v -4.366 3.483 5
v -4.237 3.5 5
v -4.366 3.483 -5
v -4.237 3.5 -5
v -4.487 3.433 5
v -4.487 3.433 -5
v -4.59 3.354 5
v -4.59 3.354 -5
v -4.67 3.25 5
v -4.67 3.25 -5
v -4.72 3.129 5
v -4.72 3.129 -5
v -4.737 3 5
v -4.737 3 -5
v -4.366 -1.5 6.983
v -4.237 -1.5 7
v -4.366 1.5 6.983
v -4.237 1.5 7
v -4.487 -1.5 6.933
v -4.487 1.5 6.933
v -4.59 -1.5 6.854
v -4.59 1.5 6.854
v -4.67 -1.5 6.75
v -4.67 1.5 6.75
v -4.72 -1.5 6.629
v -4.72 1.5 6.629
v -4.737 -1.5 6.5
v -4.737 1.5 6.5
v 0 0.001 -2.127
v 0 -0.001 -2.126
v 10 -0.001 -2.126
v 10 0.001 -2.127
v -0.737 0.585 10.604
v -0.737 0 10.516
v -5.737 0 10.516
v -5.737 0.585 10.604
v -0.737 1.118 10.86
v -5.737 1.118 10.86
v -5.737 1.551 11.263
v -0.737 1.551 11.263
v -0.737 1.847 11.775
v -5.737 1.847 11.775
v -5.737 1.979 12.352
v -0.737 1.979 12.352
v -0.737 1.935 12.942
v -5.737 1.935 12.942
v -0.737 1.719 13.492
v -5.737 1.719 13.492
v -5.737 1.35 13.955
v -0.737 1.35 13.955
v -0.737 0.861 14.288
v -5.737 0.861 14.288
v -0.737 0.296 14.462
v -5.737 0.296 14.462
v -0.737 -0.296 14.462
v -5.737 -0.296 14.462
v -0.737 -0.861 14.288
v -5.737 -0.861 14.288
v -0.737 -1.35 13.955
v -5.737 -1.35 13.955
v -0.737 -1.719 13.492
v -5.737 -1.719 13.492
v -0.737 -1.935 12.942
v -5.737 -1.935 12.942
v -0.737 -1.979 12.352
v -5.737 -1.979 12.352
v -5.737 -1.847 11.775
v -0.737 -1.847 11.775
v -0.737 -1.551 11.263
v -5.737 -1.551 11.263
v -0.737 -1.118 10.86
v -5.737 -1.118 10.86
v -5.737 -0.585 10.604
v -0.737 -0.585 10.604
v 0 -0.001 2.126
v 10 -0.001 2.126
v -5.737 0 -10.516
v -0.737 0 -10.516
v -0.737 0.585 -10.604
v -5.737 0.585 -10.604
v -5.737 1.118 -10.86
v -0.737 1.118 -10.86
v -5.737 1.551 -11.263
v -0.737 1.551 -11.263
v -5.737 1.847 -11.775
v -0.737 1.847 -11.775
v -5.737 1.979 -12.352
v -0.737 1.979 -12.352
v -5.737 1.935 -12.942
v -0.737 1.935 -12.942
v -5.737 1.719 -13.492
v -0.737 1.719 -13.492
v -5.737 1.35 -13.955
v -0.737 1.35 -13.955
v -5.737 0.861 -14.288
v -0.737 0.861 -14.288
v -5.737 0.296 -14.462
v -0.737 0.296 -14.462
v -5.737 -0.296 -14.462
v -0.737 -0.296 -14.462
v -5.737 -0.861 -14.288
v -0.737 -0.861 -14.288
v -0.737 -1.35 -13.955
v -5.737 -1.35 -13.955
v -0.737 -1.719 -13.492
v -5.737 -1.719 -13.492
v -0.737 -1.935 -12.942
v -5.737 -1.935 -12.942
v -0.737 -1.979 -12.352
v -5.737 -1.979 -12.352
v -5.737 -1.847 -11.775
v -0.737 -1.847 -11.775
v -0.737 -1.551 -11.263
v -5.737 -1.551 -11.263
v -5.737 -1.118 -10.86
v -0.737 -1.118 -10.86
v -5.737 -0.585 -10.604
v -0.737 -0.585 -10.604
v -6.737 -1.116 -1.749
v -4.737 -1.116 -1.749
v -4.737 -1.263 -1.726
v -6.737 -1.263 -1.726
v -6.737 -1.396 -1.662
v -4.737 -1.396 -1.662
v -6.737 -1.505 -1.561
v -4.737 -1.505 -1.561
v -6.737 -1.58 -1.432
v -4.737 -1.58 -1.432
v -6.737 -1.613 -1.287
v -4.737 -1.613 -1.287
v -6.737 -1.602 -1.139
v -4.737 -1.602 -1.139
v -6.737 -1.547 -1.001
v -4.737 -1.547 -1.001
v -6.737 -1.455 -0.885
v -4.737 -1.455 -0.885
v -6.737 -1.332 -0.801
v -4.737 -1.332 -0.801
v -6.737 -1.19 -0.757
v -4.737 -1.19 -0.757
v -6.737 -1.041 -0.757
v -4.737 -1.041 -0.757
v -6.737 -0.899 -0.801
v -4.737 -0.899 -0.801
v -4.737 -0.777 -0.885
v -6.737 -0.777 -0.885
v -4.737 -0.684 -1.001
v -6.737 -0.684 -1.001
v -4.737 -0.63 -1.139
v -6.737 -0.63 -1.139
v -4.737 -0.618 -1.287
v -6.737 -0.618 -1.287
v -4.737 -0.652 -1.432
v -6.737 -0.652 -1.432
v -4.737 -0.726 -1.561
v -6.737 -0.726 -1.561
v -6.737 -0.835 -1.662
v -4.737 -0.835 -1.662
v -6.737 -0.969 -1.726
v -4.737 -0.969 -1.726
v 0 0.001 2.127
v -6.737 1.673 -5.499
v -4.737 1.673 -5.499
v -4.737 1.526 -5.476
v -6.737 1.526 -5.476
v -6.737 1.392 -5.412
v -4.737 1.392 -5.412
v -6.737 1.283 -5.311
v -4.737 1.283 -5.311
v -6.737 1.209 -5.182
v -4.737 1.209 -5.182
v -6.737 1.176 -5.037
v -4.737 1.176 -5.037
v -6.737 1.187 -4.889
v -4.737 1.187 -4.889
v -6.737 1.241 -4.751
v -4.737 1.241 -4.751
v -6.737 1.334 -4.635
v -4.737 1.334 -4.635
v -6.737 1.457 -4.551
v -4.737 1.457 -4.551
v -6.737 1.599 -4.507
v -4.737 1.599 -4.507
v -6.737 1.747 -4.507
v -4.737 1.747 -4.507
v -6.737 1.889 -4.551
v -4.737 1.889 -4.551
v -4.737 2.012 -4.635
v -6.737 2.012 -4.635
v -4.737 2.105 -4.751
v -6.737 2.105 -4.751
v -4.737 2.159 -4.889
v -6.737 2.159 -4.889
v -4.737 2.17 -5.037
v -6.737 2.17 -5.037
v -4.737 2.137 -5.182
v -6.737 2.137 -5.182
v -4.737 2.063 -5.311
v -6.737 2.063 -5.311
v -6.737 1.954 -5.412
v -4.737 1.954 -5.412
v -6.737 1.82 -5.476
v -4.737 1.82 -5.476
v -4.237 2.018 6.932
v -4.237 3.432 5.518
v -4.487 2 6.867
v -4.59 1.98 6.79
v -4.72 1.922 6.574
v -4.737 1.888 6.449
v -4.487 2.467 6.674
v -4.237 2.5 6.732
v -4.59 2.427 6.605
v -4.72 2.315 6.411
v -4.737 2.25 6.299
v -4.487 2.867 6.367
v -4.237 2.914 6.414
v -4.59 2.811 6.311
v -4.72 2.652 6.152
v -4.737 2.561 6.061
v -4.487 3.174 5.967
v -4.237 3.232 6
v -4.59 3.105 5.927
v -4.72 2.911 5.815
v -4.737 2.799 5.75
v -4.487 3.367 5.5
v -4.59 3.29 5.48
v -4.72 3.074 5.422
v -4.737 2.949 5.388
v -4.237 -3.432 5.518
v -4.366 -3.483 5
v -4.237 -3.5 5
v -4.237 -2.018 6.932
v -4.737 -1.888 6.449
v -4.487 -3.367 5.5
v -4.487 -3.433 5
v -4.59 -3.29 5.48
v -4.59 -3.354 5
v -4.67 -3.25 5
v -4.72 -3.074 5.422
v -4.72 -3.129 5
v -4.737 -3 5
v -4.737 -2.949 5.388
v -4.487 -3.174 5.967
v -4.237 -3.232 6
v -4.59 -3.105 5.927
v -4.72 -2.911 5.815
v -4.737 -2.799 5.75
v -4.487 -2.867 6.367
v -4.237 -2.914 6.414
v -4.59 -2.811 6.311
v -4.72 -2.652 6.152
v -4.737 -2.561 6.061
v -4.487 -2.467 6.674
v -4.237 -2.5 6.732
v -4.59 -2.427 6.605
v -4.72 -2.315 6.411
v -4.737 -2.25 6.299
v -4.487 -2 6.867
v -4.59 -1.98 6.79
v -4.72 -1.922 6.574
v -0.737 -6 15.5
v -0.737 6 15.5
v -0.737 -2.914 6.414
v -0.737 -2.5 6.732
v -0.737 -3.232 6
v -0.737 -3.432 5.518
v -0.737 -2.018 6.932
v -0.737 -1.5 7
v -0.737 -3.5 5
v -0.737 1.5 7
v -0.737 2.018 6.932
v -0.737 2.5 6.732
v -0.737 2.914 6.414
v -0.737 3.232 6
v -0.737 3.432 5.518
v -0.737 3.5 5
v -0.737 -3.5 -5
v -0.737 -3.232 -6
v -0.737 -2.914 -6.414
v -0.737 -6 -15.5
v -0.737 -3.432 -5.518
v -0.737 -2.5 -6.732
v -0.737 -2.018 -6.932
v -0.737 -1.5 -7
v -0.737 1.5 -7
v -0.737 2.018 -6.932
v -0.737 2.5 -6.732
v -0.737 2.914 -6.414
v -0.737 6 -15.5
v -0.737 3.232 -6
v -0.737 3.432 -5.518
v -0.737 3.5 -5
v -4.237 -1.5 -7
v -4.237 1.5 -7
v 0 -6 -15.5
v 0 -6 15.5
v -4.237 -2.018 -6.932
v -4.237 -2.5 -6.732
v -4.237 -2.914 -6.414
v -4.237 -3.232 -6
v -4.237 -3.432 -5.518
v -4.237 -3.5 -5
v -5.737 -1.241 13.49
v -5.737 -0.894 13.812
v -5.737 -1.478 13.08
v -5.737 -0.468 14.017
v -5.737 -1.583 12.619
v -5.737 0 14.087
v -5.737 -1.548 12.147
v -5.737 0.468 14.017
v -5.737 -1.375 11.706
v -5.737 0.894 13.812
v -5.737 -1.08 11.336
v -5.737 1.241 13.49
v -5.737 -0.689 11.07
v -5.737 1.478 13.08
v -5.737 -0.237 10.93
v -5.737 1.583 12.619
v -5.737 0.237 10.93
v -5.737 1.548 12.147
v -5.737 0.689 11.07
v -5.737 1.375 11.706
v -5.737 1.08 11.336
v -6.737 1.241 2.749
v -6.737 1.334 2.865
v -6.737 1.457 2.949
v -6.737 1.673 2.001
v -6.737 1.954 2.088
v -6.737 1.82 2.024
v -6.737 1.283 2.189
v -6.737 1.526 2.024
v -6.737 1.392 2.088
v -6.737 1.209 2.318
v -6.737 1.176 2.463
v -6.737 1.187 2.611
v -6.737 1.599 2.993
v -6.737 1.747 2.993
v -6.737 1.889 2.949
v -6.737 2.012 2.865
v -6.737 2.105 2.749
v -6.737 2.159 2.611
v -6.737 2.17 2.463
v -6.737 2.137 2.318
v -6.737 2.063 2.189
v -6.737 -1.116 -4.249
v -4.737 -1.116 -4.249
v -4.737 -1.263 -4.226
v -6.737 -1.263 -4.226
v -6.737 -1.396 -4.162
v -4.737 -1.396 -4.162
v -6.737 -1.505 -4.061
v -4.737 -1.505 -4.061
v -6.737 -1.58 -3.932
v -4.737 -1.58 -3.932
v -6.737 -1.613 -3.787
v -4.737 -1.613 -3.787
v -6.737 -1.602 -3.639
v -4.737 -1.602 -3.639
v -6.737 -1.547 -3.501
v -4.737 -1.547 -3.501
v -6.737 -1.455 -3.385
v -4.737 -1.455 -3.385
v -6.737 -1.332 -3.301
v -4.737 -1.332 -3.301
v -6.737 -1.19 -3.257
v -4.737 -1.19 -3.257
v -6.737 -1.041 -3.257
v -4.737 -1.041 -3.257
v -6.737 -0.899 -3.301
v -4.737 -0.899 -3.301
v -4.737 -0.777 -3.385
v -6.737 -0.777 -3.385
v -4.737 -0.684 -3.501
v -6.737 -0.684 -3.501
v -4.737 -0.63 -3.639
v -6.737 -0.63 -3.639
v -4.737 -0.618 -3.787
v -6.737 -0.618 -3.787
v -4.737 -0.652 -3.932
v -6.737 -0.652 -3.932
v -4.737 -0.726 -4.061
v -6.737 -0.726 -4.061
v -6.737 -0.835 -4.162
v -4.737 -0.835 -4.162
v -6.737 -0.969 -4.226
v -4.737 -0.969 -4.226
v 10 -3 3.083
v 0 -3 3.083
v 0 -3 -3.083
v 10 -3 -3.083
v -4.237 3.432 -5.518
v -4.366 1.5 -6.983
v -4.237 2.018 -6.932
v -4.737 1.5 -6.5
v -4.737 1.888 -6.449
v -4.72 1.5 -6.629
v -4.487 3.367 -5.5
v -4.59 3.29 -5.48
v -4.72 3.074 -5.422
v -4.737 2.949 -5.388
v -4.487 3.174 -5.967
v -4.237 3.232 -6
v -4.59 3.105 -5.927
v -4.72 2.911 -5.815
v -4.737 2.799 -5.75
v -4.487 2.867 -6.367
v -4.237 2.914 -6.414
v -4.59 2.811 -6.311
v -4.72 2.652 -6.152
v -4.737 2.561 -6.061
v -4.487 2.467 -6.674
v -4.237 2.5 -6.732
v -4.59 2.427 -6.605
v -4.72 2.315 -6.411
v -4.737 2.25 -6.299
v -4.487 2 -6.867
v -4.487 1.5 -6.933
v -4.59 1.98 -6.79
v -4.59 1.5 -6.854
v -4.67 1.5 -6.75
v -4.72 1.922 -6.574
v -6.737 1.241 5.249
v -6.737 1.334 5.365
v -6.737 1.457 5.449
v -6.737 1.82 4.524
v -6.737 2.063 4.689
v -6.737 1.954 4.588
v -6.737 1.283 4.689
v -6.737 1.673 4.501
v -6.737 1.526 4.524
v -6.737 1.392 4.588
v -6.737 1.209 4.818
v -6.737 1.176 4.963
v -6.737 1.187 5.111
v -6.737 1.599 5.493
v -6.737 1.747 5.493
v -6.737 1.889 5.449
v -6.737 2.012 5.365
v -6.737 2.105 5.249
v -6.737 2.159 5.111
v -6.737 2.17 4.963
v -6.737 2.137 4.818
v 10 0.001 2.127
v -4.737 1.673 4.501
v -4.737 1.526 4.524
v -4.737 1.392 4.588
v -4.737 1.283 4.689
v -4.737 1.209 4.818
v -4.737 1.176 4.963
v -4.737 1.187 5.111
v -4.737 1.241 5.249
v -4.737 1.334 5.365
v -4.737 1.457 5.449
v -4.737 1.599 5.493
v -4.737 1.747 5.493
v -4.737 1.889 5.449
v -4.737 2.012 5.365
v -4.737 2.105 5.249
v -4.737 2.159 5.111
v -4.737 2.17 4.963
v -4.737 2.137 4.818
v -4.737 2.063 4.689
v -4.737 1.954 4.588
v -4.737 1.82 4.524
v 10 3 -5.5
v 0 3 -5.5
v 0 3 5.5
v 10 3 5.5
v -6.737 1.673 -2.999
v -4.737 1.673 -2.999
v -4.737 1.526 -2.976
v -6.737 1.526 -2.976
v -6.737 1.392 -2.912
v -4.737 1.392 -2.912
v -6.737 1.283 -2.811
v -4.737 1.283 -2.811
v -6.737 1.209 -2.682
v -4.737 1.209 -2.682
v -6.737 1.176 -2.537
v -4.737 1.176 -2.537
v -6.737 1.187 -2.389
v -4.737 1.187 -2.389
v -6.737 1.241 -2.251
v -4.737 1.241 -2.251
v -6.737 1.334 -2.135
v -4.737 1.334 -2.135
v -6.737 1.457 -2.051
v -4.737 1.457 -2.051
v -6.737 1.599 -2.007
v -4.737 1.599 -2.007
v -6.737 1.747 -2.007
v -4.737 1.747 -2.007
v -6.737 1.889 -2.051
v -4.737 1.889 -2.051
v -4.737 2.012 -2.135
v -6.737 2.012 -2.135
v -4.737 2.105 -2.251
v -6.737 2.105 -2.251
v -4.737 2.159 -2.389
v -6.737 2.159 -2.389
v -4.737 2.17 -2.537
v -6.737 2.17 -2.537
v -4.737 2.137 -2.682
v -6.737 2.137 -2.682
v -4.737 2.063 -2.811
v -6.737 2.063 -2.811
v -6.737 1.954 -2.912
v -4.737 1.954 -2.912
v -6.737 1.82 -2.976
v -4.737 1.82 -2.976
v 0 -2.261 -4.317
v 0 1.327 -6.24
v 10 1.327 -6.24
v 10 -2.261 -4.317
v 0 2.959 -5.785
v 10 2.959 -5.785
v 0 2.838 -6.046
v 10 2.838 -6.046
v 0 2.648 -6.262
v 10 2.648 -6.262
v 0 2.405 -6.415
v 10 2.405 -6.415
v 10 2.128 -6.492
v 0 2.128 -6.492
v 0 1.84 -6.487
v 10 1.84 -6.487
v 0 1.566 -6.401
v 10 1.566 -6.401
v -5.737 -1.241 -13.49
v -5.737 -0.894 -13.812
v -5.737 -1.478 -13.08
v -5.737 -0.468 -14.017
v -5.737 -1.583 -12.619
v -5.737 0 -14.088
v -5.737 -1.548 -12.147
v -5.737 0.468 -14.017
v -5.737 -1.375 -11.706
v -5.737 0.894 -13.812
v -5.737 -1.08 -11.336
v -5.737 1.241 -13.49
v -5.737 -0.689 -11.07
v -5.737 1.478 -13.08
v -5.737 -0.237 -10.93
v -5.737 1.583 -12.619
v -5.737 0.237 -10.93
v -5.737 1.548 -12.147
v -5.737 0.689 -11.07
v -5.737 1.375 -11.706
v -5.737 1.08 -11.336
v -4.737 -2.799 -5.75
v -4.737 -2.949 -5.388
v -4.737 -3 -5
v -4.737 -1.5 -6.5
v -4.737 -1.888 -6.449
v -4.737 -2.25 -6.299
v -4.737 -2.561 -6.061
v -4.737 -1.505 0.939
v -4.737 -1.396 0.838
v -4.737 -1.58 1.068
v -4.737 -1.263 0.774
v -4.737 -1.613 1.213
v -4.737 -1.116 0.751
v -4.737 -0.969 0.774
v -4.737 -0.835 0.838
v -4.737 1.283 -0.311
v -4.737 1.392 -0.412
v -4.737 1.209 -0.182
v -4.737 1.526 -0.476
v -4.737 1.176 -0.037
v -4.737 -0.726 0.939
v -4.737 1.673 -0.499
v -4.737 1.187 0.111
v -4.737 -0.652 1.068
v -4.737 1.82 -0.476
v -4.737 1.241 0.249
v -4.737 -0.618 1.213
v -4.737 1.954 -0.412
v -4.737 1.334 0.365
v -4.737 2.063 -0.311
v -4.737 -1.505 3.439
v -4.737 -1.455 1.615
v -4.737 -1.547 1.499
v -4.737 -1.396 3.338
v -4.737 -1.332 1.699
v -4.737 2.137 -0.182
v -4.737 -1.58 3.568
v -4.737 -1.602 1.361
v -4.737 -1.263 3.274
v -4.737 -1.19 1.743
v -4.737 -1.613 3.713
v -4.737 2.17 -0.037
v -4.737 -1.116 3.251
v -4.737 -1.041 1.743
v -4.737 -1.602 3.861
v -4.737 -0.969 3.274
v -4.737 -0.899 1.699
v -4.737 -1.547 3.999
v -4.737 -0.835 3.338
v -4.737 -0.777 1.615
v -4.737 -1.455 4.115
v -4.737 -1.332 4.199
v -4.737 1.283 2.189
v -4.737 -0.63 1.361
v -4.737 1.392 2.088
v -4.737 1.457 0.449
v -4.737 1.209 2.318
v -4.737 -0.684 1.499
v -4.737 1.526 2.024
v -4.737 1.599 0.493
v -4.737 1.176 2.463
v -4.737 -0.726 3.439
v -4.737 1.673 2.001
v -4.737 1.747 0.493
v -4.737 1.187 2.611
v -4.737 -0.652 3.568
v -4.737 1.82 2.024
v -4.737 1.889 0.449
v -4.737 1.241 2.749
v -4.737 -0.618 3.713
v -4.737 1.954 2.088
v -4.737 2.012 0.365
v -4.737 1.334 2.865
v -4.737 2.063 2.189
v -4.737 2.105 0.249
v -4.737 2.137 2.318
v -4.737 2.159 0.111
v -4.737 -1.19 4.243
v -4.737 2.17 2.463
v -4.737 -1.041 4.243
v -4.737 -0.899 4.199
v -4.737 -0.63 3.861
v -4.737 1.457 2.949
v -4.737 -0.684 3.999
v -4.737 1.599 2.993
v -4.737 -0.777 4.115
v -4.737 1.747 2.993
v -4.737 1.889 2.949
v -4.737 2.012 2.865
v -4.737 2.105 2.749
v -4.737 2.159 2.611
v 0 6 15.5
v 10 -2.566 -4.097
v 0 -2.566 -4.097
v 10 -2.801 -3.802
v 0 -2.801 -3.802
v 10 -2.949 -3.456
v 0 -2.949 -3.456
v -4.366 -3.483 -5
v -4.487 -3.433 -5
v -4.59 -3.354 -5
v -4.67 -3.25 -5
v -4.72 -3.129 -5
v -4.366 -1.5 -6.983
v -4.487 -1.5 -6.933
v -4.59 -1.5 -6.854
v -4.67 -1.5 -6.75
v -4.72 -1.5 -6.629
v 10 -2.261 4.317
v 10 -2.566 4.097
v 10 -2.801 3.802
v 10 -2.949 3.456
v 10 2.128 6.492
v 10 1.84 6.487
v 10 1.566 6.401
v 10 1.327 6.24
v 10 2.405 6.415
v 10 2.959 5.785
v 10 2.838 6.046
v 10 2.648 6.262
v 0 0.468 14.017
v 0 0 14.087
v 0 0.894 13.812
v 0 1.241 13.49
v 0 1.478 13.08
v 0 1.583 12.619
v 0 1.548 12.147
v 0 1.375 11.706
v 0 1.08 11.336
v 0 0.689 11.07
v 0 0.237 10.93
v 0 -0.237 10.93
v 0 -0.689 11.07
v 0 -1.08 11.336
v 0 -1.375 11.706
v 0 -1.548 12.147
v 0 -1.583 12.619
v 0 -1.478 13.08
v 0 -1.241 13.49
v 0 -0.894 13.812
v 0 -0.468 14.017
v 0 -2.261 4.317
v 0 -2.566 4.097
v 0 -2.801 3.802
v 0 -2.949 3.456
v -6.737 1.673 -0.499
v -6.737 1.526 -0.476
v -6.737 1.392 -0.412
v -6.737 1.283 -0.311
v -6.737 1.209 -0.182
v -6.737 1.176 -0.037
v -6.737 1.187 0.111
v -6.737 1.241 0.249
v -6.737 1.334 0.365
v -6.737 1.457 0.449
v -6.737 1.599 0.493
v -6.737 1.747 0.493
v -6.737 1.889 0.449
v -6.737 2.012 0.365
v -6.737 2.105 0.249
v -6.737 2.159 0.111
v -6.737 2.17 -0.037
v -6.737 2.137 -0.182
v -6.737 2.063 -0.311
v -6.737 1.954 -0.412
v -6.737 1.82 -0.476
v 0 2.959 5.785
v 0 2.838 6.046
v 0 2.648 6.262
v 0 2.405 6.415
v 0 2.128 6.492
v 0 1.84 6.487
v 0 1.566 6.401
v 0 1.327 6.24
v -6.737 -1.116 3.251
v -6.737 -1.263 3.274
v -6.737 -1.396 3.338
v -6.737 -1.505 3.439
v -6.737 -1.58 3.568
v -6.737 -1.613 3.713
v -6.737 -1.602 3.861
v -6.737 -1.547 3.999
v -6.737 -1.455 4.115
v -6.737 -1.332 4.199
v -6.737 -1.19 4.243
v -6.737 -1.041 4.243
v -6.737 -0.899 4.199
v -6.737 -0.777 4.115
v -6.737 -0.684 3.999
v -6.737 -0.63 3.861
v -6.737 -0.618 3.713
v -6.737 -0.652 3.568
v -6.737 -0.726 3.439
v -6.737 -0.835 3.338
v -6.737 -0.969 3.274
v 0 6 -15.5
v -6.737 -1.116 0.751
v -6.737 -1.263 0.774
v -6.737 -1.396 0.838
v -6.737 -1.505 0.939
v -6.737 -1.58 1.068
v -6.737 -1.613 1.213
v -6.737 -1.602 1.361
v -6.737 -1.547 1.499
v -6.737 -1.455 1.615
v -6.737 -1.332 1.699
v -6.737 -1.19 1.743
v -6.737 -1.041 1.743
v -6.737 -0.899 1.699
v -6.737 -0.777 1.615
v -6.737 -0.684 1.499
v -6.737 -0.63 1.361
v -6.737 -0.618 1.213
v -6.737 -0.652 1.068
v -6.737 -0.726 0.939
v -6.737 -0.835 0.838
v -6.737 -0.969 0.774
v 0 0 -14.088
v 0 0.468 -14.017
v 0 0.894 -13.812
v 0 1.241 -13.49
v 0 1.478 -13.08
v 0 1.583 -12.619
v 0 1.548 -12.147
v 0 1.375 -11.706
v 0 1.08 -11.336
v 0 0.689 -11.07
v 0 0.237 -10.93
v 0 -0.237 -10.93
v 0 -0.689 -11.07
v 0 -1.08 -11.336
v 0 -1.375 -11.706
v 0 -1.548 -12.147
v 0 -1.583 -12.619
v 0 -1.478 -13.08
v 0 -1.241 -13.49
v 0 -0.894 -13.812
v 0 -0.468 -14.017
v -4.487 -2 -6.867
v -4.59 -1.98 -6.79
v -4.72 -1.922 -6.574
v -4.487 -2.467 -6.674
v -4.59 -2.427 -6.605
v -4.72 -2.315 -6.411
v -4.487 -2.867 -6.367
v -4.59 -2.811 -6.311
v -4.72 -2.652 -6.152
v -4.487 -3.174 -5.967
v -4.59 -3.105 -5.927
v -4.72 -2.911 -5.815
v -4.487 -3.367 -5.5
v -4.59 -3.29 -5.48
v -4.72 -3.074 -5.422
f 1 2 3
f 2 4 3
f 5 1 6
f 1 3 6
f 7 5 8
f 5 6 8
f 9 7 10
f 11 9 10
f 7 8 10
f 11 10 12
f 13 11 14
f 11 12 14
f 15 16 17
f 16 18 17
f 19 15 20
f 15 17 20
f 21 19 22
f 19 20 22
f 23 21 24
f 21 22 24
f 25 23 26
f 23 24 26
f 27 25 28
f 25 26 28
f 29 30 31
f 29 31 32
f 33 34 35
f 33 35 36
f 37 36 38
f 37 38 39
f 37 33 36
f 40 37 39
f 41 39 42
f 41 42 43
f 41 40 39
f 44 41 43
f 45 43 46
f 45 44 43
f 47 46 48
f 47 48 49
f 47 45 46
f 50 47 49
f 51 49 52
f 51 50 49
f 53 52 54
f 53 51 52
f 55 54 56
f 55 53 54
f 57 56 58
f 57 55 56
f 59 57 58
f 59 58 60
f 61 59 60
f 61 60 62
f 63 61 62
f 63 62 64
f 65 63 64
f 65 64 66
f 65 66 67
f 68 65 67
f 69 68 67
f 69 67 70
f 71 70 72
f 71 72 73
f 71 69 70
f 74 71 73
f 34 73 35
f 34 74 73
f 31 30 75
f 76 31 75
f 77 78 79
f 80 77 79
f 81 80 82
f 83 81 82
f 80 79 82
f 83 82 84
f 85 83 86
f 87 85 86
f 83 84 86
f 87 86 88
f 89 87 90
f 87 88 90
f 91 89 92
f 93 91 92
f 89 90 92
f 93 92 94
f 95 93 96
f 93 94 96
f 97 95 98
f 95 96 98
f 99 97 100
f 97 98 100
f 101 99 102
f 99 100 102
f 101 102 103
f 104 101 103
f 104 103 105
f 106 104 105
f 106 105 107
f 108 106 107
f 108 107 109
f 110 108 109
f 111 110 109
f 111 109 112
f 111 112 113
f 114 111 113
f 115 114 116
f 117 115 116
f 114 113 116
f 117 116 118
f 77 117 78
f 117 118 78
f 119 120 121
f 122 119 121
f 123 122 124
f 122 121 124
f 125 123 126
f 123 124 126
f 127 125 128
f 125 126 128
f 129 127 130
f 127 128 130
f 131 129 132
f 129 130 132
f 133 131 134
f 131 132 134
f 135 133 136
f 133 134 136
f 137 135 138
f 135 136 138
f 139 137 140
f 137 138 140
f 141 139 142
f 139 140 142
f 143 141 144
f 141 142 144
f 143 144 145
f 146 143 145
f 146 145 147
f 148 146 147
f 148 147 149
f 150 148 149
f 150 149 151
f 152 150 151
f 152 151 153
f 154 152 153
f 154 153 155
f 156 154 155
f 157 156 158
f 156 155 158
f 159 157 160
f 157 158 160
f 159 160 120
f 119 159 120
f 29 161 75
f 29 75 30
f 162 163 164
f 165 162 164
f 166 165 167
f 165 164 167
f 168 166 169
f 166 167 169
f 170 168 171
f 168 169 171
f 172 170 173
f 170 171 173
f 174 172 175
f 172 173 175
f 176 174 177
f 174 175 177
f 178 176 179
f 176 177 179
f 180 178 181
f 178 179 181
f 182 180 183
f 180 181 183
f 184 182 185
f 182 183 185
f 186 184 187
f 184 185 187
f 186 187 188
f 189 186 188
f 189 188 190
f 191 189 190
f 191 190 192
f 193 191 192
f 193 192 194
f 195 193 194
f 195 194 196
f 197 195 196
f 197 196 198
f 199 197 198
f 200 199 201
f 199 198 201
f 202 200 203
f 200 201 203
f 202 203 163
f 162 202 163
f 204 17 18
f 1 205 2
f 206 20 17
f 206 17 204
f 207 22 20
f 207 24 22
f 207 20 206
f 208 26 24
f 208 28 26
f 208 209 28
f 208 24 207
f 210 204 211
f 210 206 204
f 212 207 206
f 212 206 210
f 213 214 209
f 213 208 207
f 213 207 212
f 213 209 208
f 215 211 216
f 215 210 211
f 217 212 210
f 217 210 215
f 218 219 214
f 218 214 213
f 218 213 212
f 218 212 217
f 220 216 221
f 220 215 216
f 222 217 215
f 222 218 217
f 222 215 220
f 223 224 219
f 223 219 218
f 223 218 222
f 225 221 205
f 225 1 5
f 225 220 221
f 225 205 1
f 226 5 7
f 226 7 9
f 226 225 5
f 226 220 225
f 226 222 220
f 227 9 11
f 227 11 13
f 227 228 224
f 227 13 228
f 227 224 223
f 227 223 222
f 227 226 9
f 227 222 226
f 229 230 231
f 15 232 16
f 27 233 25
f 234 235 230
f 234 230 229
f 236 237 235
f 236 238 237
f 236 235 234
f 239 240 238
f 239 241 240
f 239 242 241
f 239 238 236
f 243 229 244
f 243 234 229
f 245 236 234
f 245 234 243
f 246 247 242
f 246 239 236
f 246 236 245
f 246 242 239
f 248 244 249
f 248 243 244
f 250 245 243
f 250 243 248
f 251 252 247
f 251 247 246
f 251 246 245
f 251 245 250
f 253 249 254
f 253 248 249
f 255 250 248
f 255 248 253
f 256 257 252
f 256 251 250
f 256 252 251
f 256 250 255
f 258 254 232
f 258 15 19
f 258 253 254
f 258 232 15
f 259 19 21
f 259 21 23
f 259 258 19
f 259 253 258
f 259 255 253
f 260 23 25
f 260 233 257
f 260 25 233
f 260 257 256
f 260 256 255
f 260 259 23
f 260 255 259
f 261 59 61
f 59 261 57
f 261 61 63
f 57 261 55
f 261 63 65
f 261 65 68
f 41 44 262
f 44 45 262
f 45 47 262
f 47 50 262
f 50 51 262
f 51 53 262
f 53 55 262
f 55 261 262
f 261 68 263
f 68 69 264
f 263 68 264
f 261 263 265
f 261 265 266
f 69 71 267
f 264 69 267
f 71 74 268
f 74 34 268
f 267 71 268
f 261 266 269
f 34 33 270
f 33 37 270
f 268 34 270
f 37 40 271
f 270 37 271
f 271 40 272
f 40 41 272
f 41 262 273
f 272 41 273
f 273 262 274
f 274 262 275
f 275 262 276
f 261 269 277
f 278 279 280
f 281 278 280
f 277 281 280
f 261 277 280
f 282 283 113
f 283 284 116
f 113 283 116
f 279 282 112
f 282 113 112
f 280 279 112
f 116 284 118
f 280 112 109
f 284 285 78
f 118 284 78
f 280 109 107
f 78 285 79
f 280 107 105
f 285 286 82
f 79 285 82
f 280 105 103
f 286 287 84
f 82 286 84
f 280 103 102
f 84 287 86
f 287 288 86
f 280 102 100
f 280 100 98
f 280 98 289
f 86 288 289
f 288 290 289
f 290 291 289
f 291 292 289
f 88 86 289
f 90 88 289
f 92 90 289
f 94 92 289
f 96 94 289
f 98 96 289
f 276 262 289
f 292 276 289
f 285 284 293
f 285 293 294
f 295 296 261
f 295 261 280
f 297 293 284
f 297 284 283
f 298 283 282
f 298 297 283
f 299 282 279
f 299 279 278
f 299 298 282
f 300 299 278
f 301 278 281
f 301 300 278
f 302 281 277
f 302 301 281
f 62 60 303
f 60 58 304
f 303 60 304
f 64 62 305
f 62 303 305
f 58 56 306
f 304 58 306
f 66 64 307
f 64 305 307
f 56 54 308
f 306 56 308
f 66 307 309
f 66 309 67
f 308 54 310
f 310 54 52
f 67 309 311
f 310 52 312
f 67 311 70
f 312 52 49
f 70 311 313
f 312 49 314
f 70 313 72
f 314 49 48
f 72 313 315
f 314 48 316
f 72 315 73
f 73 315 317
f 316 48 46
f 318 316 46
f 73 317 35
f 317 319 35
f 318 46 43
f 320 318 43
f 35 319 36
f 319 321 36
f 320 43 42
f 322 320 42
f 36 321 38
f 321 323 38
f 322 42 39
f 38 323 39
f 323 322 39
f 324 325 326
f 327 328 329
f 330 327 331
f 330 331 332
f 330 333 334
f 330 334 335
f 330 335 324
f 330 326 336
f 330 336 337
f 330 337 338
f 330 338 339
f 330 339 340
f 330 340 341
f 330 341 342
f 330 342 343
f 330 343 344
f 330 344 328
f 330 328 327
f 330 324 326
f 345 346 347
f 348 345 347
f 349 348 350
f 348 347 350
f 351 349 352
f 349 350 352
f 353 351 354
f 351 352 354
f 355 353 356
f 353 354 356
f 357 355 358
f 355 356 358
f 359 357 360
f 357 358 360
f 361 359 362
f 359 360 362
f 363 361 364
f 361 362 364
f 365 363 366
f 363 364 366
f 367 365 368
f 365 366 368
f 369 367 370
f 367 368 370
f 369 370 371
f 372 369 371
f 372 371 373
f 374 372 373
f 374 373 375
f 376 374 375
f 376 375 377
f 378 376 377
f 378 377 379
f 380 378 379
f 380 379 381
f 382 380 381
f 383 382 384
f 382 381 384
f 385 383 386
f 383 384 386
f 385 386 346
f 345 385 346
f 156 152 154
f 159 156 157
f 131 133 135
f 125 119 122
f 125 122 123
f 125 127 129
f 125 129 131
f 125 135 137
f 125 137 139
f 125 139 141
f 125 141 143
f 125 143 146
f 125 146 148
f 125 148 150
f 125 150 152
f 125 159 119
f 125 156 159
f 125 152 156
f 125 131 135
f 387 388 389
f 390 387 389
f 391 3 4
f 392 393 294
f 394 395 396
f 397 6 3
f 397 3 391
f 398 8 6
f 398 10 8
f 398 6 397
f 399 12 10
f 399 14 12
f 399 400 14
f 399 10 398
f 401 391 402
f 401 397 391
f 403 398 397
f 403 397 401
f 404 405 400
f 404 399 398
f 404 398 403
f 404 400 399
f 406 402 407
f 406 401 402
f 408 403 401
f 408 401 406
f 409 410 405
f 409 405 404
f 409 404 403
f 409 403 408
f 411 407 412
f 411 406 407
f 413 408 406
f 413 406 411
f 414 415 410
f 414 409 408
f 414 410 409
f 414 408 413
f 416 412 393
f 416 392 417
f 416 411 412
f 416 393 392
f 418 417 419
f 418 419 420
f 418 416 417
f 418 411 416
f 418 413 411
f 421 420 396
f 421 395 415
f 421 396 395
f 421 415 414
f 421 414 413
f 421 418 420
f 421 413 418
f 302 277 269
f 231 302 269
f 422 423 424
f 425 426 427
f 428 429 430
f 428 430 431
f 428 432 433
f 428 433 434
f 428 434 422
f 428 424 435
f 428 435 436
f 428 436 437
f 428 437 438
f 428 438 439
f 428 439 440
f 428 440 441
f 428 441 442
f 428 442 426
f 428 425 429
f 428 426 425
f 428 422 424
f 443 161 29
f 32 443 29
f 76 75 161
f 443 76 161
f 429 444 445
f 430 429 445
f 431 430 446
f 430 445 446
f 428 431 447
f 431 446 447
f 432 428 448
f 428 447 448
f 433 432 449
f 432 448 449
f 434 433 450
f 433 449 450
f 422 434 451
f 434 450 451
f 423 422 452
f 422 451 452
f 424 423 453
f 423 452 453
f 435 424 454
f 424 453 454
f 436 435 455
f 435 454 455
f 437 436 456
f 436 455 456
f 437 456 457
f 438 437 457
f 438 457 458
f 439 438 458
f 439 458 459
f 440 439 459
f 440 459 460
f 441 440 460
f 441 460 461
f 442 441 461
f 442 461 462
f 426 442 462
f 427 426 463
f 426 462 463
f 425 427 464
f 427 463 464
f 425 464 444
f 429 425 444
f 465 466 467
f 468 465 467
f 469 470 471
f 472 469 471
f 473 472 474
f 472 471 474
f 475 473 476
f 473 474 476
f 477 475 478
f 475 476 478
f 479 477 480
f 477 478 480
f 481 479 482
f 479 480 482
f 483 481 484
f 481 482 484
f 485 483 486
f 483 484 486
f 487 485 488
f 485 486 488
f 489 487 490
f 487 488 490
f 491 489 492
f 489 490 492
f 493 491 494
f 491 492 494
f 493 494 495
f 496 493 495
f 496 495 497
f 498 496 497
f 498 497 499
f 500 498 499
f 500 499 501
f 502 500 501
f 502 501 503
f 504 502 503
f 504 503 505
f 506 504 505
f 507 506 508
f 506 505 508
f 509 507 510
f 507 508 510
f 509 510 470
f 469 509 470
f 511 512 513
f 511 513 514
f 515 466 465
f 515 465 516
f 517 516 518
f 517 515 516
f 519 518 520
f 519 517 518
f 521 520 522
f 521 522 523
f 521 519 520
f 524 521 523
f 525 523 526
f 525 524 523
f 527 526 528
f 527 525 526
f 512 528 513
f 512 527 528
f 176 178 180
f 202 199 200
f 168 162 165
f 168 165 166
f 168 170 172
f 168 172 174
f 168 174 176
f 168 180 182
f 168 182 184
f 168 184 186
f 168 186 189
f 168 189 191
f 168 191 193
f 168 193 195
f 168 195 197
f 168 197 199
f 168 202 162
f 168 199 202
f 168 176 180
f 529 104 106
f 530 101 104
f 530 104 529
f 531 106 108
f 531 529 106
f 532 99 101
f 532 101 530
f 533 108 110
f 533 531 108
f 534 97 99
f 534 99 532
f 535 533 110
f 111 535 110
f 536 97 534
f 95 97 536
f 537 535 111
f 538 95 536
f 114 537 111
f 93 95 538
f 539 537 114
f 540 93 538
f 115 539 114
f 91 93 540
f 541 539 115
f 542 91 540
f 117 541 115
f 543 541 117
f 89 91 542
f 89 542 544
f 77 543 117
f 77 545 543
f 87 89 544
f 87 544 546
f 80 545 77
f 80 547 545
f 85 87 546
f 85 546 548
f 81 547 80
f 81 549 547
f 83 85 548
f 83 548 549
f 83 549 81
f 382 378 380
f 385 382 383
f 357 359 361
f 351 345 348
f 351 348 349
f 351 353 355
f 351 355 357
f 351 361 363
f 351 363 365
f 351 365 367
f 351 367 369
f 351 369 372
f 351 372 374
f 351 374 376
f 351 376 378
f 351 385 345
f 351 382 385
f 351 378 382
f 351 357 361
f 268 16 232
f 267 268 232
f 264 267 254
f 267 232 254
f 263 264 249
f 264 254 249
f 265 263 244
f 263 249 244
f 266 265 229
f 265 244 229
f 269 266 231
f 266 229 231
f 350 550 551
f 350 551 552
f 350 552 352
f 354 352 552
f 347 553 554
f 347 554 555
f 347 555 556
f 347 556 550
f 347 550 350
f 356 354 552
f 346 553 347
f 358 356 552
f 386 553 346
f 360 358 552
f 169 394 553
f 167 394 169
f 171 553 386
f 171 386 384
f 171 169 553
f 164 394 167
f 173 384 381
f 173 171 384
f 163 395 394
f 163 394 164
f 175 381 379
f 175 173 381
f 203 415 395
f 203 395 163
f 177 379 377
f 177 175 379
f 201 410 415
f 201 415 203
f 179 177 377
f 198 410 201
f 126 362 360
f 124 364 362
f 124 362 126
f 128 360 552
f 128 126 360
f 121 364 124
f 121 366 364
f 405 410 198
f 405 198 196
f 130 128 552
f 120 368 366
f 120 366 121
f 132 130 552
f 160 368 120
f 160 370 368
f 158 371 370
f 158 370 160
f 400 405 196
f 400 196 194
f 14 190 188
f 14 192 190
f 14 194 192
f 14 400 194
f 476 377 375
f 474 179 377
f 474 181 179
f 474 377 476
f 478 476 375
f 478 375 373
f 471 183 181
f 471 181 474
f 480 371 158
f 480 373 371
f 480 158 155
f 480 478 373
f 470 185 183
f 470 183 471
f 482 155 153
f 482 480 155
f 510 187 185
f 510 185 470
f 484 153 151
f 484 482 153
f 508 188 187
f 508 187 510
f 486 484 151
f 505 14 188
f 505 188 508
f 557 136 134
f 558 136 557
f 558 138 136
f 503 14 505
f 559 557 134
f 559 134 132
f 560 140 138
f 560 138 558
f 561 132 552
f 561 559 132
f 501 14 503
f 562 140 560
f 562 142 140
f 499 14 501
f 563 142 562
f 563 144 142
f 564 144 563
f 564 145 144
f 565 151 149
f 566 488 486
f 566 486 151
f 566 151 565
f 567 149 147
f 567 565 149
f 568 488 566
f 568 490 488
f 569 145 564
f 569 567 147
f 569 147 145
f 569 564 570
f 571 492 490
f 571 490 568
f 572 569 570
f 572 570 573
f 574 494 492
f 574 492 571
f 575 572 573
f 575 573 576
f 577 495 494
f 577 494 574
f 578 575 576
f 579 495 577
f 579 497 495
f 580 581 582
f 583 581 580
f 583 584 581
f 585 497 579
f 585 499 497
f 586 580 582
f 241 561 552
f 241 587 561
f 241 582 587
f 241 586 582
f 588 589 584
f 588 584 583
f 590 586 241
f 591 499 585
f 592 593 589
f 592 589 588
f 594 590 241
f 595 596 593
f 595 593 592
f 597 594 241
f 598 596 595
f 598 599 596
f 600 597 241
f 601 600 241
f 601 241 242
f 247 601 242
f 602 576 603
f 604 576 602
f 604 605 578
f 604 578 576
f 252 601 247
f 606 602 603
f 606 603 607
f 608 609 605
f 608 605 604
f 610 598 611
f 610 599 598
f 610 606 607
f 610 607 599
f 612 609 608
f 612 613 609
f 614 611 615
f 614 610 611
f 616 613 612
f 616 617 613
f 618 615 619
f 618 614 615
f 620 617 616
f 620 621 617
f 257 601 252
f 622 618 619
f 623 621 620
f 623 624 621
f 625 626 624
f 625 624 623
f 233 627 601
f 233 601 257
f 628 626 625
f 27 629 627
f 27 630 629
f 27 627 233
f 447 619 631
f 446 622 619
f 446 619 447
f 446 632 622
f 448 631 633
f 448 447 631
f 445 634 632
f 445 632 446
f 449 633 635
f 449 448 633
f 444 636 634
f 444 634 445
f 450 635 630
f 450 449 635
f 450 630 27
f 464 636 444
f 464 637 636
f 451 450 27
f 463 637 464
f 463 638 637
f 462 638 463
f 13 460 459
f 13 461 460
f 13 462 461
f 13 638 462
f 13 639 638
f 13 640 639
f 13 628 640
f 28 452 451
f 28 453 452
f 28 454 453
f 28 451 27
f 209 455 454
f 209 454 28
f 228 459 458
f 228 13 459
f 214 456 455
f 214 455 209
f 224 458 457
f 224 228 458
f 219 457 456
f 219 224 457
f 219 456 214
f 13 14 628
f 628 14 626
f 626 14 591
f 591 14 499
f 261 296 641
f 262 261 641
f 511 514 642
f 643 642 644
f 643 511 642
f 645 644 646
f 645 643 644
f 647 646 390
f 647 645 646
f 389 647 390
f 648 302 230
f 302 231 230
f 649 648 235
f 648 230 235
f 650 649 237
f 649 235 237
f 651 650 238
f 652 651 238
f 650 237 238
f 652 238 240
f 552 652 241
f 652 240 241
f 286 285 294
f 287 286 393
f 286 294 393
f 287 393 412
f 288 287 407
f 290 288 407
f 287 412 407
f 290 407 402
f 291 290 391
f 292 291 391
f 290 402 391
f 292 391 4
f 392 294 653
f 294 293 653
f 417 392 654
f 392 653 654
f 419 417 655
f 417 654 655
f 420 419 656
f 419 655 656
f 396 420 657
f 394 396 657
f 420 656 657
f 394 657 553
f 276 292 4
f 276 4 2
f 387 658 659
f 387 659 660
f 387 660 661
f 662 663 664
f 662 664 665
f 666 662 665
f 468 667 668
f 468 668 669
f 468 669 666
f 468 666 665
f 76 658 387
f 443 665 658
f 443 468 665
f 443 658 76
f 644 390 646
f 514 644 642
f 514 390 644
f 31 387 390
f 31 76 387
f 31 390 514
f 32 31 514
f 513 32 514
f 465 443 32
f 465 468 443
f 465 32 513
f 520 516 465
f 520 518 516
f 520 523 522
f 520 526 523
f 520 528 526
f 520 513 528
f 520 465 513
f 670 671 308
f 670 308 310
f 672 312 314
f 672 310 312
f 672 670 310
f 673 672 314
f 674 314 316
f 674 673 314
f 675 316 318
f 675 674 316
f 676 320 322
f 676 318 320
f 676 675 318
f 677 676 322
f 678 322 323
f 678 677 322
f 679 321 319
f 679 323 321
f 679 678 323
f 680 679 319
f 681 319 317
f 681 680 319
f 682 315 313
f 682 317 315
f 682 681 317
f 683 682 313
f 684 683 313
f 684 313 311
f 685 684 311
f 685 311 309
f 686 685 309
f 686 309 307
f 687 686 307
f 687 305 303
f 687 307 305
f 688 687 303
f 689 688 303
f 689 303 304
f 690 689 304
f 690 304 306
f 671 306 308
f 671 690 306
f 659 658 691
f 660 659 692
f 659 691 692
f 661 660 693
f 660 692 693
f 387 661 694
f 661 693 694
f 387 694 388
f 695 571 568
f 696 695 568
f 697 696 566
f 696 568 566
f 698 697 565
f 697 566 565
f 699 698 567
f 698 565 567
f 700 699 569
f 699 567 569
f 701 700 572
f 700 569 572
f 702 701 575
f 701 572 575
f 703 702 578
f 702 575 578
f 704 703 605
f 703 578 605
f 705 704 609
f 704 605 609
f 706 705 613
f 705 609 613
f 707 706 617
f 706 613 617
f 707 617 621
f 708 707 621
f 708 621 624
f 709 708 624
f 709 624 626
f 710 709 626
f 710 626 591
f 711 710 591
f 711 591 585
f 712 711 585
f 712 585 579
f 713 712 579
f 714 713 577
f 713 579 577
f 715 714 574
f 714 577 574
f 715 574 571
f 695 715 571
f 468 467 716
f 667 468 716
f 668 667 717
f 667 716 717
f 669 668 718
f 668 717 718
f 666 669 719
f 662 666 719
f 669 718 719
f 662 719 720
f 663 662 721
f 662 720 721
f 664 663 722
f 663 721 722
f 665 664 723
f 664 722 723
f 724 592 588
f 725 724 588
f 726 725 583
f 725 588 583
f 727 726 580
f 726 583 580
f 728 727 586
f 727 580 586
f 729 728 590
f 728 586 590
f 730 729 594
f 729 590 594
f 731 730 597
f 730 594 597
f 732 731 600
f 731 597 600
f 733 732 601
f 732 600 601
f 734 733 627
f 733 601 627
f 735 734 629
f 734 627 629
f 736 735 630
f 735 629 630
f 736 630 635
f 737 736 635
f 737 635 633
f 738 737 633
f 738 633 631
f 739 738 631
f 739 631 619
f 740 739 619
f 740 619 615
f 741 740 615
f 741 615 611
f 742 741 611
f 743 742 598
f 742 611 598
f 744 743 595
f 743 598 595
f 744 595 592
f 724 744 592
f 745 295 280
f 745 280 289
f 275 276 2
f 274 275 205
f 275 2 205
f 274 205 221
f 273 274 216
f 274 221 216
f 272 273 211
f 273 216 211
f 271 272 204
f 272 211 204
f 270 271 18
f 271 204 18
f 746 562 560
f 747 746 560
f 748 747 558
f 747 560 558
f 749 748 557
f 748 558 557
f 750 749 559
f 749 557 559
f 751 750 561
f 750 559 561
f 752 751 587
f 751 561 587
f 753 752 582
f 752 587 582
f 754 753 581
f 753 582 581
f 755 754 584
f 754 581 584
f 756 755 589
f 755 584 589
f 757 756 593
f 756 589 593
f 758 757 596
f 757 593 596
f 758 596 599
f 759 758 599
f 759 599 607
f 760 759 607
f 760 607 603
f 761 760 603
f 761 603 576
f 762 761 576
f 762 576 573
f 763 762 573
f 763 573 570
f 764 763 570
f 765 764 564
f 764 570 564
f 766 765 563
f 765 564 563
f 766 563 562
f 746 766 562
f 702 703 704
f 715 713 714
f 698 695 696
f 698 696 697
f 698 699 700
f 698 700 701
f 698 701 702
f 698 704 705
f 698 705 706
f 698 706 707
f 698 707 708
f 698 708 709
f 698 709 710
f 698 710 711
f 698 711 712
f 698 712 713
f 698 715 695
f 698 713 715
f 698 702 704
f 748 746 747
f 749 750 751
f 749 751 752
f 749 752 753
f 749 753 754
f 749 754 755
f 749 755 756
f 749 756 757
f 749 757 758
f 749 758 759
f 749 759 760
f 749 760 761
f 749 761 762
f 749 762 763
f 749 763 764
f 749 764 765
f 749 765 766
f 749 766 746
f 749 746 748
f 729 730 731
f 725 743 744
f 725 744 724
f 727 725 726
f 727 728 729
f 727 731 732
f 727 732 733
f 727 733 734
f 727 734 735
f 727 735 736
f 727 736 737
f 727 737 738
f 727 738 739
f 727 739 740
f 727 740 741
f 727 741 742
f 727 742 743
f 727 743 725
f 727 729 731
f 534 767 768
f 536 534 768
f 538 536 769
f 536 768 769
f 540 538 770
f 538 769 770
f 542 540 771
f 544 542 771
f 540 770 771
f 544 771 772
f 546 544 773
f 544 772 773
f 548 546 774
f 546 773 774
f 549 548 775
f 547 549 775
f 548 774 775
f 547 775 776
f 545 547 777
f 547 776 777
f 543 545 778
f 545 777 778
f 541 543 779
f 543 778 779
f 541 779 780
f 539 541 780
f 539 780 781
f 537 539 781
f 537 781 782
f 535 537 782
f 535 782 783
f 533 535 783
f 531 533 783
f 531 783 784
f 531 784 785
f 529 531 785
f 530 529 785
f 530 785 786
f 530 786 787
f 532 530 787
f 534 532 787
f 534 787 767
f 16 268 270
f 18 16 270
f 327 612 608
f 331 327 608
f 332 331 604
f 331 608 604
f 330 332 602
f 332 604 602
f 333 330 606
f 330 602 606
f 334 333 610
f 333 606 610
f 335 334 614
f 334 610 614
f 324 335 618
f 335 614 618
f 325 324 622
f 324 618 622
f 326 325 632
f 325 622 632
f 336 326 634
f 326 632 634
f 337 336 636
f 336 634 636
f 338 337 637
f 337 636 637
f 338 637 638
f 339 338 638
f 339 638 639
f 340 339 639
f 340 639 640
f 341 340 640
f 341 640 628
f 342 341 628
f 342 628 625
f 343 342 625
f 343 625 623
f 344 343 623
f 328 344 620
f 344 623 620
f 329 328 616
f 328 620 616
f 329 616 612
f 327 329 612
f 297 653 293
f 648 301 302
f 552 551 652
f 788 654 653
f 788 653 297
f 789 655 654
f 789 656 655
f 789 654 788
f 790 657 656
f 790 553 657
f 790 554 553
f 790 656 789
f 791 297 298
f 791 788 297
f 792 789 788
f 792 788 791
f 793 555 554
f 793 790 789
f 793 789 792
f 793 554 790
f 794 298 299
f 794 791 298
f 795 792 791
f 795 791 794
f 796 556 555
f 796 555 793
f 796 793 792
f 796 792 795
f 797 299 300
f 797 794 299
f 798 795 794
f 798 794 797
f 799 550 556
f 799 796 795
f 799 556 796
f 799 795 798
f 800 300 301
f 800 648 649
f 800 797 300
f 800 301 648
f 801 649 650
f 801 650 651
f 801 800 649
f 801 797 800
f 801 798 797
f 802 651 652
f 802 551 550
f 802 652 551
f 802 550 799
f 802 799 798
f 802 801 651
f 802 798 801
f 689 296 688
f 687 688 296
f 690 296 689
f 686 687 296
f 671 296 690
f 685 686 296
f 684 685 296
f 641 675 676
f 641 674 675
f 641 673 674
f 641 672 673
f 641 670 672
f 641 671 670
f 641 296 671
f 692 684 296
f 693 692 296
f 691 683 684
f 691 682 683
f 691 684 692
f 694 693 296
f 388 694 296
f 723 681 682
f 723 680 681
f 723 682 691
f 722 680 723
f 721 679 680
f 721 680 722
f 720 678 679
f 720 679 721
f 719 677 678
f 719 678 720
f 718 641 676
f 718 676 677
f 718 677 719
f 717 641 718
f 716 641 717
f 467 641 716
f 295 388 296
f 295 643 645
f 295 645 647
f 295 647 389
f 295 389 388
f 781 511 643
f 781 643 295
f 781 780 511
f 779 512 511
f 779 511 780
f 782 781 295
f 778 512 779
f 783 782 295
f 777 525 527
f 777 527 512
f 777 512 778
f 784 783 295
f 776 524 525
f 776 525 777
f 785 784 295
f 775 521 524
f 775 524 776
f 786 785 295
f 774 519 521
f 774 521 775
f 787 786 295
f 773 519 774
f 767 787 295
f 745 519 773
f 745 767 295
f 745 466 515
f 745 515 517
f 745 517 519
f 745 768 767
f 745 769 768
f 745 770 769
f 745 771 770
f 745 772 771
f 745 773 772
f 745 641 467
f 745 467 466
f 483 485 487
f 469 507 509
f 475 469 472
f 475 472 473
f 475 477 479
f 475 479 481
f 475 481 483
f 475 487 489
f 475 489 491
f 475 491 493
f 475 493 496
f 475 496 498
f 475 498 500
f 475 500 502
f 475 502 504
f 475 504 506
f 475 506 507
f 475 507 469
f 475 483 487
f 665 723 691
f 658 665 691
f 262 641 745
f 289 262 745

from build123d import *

# Parameters (mm, degrees)
SKETCH1_W                    = 31
SKETCH1_H                    = 12
BASE_FLANGE1_DEPTH           = 0.7366
EXTRUDE_THIN3_DEPTH          = 10
SKETCH8_W                    = 14
SKETCH8_H                    = 7
BOSS_EXTRUDE1_DEPTH          = 4
FILLET2_R                    = 2
FILLET3_R                    = 0.5
SKETCH9_R                    = 0.498553058
BOSS_EXTRUDE2_DEPTH          = 2
SKETCH10_R                   = 0.49857
BOSS_EXTRUDE3_DEPTH          = 2
SKETCH11_R                   = 1.984375
BOSS_EXTRUDE4_DEPTH          = 5
F_1_8_0_125_DIAMETER_HOLE1_D = 3.175


# Sheet-metal steps are written as plain solids
with BuildPart() as part:
    # Sketch1 → Base-Flange1 (new body)
    with BuildSketch(Plane(origin=(0, 0, 0), x_dir=(0, 0, -1), z_dir=(1, 0, 0))):
        Rectangle(SKETCH1_W, SKETCH1_H)
    extrude(amount=-BASE_FLANGE1_DEPTH)

    # Sketch6 → Extrude-Thin3 (add)
    with BuildSketch(Plane(origin=(0, 0, 0), x_dir=(0, 0, -1), z_dir=(1, 0, 0))):
        with BuildLine():
            Line((0, 3), (5.5, 3))
            ThreePointArc((5.5, 3), (6.414535338, 2.404506015), (6.23987009, 1.327250232))
            Line((6.23987009, 1.327250232), (4.317359578, -2.26115081))
            ThreePointArc((4.317359578, -2.26115081), (3.802471809, -2.801168417), (3.083309495, -3))
            Line((3.083309495, -3), (0, -3))
            Line((0, -3), (0, -0.001))
            Line((0, -0.001), (2.125957868, -0.001))
            Line((2.125957868, -0.001), (2.127029382, 0.001))
            Line((2.127029382, 0.001), (0, 0.001))
            Line((0, 0.001), (0, 3))
        make_face()
    extrude_thin3 = extrude(amount=EXTRUDE_THIN3_DEPTH)

    # Mirror1: Extrude-Thin3 across plane
    add(extrude_thin3.mirror(Plane.XY))

    # Sketch8 → Boss-Extrude1 (add)
    with BuildSketch(Plane.ZY.offset(0.7366)):
        Rectangle(SKETCH8_W, SKETCH8_H)
    extrude(amount=BOSS_EXTRUDE1_DEPTH)

    # Fillet2
    fillet2_edges = [part.edges().sort_by_distance(p)[0] for p in [
        (-2.7366, -3.5, 7),
        (-2.7366, 3.5, 7),
        (-2.7366, 3.5, -7),
        (-2.7366, -3.5, -7),
    ]]
    fillet(fillet2_edges, radius=FILLET2_R)

    # Fillet3
    fillet3_edges = [part.edges().sort_by_distance(p)[0] for p in [
        (-4.7366, 0, 7),
        (-4.7366, -3.5, 0),
        (-4.7366, 3.5, 0),
        (-4.7366, 0, -7),
        (-4.7366, 2.914213562, -6.414213562),
        (-4.7366, -2.914213562, -6.414213562),
        (-4.7366, 2.914213562, 6.414213562),
        (-4.7366, -2.914213562, 6.414213562),
    ]]
    fillet(fillet3_edges, radius=FILLET3_R)

    # Sketch9 → Boss-Extrude2 (add)
    with BuildSketch(Plane.ZY.offset(4.7366)):
        with Locations(Location((-5, 1.673069628, 0), (0, 0, 180))):
            Circle(SKETCH9_R)
        with Locations(Location((-2.5, 1.673069628, 0), (0, 0, 180))):
            Circle(SKETCH9_R)
        with Locations(Location((0, 1.673069628, 0), (0, 0, 180))):
            Circle(SKETCH9_R)
        with Locations(Location((2.5, 1.673069628, 0), (0, 0, 180))):
            Circle(SKETCH9_R)
        with Locations(Location((5, 1.673069628, 0), (0, 0, 180))):
            Circle(SKETCH9_R)
    extrude(amount=BOSS_EXTRUDE2_DEPTH)

    # Sketch10 → Boss-Extrude3 (add)
    with BuildSketch(Plane.ZY.offset(4.7366)):
        with Locations(Location((-3.75, -1.115638979, 0), (0, 0, 180))):
            Circle(SKETCH10_R)
        with Locations(Location((-1.25, -1.115638979, 0), (0, 0, 180))):
            Circle(SKETCH10_R)
        with Locations(Location((1.25, -1.115638979, 0), (0, 0, 180))):
            Circle(SKETCH10_R)
        with Locations(Location((3.75, -1.115638979, 0), (0, 0, 180))):
            Circle(SKETCH10_R)
    extrude(amount=BOSS_EXTRUDE3_DEPTH)

    # Sketch11 → Boss-Extrude4 (add)
    with BuildSketch(Plane.ZY.offset(0.7366)):
        with Locations((-12.5, 0)):
            Circle(SKETCH11_R)
    boss_extrude4 = extrude(amount=BOSS_EXTRUDE4_DEPTH)

    # Mirror2: Boss-Extrude4 across plane
    add(boss_extrude4.mirror(Plane.XY))

    # 1/8 (0.125) Diameter Hole1 (through all)
    with Locations(Plane.ZY.offset(5.7366)):
        with Locations((-12.5, 0)):
            f_1_8_0_125_diameter_hole1 = Hole(F_1_8_0_125_DIAMETER_HOLE1_D / 2)

    # Mirror3: 1/8 (0.125) Diameter Hole1 across plane
    add(f_1_8_0_125_diameter_hole1.mirror(Plane.XY), mode=Mode.SUBTRACT)


solid = part.part
